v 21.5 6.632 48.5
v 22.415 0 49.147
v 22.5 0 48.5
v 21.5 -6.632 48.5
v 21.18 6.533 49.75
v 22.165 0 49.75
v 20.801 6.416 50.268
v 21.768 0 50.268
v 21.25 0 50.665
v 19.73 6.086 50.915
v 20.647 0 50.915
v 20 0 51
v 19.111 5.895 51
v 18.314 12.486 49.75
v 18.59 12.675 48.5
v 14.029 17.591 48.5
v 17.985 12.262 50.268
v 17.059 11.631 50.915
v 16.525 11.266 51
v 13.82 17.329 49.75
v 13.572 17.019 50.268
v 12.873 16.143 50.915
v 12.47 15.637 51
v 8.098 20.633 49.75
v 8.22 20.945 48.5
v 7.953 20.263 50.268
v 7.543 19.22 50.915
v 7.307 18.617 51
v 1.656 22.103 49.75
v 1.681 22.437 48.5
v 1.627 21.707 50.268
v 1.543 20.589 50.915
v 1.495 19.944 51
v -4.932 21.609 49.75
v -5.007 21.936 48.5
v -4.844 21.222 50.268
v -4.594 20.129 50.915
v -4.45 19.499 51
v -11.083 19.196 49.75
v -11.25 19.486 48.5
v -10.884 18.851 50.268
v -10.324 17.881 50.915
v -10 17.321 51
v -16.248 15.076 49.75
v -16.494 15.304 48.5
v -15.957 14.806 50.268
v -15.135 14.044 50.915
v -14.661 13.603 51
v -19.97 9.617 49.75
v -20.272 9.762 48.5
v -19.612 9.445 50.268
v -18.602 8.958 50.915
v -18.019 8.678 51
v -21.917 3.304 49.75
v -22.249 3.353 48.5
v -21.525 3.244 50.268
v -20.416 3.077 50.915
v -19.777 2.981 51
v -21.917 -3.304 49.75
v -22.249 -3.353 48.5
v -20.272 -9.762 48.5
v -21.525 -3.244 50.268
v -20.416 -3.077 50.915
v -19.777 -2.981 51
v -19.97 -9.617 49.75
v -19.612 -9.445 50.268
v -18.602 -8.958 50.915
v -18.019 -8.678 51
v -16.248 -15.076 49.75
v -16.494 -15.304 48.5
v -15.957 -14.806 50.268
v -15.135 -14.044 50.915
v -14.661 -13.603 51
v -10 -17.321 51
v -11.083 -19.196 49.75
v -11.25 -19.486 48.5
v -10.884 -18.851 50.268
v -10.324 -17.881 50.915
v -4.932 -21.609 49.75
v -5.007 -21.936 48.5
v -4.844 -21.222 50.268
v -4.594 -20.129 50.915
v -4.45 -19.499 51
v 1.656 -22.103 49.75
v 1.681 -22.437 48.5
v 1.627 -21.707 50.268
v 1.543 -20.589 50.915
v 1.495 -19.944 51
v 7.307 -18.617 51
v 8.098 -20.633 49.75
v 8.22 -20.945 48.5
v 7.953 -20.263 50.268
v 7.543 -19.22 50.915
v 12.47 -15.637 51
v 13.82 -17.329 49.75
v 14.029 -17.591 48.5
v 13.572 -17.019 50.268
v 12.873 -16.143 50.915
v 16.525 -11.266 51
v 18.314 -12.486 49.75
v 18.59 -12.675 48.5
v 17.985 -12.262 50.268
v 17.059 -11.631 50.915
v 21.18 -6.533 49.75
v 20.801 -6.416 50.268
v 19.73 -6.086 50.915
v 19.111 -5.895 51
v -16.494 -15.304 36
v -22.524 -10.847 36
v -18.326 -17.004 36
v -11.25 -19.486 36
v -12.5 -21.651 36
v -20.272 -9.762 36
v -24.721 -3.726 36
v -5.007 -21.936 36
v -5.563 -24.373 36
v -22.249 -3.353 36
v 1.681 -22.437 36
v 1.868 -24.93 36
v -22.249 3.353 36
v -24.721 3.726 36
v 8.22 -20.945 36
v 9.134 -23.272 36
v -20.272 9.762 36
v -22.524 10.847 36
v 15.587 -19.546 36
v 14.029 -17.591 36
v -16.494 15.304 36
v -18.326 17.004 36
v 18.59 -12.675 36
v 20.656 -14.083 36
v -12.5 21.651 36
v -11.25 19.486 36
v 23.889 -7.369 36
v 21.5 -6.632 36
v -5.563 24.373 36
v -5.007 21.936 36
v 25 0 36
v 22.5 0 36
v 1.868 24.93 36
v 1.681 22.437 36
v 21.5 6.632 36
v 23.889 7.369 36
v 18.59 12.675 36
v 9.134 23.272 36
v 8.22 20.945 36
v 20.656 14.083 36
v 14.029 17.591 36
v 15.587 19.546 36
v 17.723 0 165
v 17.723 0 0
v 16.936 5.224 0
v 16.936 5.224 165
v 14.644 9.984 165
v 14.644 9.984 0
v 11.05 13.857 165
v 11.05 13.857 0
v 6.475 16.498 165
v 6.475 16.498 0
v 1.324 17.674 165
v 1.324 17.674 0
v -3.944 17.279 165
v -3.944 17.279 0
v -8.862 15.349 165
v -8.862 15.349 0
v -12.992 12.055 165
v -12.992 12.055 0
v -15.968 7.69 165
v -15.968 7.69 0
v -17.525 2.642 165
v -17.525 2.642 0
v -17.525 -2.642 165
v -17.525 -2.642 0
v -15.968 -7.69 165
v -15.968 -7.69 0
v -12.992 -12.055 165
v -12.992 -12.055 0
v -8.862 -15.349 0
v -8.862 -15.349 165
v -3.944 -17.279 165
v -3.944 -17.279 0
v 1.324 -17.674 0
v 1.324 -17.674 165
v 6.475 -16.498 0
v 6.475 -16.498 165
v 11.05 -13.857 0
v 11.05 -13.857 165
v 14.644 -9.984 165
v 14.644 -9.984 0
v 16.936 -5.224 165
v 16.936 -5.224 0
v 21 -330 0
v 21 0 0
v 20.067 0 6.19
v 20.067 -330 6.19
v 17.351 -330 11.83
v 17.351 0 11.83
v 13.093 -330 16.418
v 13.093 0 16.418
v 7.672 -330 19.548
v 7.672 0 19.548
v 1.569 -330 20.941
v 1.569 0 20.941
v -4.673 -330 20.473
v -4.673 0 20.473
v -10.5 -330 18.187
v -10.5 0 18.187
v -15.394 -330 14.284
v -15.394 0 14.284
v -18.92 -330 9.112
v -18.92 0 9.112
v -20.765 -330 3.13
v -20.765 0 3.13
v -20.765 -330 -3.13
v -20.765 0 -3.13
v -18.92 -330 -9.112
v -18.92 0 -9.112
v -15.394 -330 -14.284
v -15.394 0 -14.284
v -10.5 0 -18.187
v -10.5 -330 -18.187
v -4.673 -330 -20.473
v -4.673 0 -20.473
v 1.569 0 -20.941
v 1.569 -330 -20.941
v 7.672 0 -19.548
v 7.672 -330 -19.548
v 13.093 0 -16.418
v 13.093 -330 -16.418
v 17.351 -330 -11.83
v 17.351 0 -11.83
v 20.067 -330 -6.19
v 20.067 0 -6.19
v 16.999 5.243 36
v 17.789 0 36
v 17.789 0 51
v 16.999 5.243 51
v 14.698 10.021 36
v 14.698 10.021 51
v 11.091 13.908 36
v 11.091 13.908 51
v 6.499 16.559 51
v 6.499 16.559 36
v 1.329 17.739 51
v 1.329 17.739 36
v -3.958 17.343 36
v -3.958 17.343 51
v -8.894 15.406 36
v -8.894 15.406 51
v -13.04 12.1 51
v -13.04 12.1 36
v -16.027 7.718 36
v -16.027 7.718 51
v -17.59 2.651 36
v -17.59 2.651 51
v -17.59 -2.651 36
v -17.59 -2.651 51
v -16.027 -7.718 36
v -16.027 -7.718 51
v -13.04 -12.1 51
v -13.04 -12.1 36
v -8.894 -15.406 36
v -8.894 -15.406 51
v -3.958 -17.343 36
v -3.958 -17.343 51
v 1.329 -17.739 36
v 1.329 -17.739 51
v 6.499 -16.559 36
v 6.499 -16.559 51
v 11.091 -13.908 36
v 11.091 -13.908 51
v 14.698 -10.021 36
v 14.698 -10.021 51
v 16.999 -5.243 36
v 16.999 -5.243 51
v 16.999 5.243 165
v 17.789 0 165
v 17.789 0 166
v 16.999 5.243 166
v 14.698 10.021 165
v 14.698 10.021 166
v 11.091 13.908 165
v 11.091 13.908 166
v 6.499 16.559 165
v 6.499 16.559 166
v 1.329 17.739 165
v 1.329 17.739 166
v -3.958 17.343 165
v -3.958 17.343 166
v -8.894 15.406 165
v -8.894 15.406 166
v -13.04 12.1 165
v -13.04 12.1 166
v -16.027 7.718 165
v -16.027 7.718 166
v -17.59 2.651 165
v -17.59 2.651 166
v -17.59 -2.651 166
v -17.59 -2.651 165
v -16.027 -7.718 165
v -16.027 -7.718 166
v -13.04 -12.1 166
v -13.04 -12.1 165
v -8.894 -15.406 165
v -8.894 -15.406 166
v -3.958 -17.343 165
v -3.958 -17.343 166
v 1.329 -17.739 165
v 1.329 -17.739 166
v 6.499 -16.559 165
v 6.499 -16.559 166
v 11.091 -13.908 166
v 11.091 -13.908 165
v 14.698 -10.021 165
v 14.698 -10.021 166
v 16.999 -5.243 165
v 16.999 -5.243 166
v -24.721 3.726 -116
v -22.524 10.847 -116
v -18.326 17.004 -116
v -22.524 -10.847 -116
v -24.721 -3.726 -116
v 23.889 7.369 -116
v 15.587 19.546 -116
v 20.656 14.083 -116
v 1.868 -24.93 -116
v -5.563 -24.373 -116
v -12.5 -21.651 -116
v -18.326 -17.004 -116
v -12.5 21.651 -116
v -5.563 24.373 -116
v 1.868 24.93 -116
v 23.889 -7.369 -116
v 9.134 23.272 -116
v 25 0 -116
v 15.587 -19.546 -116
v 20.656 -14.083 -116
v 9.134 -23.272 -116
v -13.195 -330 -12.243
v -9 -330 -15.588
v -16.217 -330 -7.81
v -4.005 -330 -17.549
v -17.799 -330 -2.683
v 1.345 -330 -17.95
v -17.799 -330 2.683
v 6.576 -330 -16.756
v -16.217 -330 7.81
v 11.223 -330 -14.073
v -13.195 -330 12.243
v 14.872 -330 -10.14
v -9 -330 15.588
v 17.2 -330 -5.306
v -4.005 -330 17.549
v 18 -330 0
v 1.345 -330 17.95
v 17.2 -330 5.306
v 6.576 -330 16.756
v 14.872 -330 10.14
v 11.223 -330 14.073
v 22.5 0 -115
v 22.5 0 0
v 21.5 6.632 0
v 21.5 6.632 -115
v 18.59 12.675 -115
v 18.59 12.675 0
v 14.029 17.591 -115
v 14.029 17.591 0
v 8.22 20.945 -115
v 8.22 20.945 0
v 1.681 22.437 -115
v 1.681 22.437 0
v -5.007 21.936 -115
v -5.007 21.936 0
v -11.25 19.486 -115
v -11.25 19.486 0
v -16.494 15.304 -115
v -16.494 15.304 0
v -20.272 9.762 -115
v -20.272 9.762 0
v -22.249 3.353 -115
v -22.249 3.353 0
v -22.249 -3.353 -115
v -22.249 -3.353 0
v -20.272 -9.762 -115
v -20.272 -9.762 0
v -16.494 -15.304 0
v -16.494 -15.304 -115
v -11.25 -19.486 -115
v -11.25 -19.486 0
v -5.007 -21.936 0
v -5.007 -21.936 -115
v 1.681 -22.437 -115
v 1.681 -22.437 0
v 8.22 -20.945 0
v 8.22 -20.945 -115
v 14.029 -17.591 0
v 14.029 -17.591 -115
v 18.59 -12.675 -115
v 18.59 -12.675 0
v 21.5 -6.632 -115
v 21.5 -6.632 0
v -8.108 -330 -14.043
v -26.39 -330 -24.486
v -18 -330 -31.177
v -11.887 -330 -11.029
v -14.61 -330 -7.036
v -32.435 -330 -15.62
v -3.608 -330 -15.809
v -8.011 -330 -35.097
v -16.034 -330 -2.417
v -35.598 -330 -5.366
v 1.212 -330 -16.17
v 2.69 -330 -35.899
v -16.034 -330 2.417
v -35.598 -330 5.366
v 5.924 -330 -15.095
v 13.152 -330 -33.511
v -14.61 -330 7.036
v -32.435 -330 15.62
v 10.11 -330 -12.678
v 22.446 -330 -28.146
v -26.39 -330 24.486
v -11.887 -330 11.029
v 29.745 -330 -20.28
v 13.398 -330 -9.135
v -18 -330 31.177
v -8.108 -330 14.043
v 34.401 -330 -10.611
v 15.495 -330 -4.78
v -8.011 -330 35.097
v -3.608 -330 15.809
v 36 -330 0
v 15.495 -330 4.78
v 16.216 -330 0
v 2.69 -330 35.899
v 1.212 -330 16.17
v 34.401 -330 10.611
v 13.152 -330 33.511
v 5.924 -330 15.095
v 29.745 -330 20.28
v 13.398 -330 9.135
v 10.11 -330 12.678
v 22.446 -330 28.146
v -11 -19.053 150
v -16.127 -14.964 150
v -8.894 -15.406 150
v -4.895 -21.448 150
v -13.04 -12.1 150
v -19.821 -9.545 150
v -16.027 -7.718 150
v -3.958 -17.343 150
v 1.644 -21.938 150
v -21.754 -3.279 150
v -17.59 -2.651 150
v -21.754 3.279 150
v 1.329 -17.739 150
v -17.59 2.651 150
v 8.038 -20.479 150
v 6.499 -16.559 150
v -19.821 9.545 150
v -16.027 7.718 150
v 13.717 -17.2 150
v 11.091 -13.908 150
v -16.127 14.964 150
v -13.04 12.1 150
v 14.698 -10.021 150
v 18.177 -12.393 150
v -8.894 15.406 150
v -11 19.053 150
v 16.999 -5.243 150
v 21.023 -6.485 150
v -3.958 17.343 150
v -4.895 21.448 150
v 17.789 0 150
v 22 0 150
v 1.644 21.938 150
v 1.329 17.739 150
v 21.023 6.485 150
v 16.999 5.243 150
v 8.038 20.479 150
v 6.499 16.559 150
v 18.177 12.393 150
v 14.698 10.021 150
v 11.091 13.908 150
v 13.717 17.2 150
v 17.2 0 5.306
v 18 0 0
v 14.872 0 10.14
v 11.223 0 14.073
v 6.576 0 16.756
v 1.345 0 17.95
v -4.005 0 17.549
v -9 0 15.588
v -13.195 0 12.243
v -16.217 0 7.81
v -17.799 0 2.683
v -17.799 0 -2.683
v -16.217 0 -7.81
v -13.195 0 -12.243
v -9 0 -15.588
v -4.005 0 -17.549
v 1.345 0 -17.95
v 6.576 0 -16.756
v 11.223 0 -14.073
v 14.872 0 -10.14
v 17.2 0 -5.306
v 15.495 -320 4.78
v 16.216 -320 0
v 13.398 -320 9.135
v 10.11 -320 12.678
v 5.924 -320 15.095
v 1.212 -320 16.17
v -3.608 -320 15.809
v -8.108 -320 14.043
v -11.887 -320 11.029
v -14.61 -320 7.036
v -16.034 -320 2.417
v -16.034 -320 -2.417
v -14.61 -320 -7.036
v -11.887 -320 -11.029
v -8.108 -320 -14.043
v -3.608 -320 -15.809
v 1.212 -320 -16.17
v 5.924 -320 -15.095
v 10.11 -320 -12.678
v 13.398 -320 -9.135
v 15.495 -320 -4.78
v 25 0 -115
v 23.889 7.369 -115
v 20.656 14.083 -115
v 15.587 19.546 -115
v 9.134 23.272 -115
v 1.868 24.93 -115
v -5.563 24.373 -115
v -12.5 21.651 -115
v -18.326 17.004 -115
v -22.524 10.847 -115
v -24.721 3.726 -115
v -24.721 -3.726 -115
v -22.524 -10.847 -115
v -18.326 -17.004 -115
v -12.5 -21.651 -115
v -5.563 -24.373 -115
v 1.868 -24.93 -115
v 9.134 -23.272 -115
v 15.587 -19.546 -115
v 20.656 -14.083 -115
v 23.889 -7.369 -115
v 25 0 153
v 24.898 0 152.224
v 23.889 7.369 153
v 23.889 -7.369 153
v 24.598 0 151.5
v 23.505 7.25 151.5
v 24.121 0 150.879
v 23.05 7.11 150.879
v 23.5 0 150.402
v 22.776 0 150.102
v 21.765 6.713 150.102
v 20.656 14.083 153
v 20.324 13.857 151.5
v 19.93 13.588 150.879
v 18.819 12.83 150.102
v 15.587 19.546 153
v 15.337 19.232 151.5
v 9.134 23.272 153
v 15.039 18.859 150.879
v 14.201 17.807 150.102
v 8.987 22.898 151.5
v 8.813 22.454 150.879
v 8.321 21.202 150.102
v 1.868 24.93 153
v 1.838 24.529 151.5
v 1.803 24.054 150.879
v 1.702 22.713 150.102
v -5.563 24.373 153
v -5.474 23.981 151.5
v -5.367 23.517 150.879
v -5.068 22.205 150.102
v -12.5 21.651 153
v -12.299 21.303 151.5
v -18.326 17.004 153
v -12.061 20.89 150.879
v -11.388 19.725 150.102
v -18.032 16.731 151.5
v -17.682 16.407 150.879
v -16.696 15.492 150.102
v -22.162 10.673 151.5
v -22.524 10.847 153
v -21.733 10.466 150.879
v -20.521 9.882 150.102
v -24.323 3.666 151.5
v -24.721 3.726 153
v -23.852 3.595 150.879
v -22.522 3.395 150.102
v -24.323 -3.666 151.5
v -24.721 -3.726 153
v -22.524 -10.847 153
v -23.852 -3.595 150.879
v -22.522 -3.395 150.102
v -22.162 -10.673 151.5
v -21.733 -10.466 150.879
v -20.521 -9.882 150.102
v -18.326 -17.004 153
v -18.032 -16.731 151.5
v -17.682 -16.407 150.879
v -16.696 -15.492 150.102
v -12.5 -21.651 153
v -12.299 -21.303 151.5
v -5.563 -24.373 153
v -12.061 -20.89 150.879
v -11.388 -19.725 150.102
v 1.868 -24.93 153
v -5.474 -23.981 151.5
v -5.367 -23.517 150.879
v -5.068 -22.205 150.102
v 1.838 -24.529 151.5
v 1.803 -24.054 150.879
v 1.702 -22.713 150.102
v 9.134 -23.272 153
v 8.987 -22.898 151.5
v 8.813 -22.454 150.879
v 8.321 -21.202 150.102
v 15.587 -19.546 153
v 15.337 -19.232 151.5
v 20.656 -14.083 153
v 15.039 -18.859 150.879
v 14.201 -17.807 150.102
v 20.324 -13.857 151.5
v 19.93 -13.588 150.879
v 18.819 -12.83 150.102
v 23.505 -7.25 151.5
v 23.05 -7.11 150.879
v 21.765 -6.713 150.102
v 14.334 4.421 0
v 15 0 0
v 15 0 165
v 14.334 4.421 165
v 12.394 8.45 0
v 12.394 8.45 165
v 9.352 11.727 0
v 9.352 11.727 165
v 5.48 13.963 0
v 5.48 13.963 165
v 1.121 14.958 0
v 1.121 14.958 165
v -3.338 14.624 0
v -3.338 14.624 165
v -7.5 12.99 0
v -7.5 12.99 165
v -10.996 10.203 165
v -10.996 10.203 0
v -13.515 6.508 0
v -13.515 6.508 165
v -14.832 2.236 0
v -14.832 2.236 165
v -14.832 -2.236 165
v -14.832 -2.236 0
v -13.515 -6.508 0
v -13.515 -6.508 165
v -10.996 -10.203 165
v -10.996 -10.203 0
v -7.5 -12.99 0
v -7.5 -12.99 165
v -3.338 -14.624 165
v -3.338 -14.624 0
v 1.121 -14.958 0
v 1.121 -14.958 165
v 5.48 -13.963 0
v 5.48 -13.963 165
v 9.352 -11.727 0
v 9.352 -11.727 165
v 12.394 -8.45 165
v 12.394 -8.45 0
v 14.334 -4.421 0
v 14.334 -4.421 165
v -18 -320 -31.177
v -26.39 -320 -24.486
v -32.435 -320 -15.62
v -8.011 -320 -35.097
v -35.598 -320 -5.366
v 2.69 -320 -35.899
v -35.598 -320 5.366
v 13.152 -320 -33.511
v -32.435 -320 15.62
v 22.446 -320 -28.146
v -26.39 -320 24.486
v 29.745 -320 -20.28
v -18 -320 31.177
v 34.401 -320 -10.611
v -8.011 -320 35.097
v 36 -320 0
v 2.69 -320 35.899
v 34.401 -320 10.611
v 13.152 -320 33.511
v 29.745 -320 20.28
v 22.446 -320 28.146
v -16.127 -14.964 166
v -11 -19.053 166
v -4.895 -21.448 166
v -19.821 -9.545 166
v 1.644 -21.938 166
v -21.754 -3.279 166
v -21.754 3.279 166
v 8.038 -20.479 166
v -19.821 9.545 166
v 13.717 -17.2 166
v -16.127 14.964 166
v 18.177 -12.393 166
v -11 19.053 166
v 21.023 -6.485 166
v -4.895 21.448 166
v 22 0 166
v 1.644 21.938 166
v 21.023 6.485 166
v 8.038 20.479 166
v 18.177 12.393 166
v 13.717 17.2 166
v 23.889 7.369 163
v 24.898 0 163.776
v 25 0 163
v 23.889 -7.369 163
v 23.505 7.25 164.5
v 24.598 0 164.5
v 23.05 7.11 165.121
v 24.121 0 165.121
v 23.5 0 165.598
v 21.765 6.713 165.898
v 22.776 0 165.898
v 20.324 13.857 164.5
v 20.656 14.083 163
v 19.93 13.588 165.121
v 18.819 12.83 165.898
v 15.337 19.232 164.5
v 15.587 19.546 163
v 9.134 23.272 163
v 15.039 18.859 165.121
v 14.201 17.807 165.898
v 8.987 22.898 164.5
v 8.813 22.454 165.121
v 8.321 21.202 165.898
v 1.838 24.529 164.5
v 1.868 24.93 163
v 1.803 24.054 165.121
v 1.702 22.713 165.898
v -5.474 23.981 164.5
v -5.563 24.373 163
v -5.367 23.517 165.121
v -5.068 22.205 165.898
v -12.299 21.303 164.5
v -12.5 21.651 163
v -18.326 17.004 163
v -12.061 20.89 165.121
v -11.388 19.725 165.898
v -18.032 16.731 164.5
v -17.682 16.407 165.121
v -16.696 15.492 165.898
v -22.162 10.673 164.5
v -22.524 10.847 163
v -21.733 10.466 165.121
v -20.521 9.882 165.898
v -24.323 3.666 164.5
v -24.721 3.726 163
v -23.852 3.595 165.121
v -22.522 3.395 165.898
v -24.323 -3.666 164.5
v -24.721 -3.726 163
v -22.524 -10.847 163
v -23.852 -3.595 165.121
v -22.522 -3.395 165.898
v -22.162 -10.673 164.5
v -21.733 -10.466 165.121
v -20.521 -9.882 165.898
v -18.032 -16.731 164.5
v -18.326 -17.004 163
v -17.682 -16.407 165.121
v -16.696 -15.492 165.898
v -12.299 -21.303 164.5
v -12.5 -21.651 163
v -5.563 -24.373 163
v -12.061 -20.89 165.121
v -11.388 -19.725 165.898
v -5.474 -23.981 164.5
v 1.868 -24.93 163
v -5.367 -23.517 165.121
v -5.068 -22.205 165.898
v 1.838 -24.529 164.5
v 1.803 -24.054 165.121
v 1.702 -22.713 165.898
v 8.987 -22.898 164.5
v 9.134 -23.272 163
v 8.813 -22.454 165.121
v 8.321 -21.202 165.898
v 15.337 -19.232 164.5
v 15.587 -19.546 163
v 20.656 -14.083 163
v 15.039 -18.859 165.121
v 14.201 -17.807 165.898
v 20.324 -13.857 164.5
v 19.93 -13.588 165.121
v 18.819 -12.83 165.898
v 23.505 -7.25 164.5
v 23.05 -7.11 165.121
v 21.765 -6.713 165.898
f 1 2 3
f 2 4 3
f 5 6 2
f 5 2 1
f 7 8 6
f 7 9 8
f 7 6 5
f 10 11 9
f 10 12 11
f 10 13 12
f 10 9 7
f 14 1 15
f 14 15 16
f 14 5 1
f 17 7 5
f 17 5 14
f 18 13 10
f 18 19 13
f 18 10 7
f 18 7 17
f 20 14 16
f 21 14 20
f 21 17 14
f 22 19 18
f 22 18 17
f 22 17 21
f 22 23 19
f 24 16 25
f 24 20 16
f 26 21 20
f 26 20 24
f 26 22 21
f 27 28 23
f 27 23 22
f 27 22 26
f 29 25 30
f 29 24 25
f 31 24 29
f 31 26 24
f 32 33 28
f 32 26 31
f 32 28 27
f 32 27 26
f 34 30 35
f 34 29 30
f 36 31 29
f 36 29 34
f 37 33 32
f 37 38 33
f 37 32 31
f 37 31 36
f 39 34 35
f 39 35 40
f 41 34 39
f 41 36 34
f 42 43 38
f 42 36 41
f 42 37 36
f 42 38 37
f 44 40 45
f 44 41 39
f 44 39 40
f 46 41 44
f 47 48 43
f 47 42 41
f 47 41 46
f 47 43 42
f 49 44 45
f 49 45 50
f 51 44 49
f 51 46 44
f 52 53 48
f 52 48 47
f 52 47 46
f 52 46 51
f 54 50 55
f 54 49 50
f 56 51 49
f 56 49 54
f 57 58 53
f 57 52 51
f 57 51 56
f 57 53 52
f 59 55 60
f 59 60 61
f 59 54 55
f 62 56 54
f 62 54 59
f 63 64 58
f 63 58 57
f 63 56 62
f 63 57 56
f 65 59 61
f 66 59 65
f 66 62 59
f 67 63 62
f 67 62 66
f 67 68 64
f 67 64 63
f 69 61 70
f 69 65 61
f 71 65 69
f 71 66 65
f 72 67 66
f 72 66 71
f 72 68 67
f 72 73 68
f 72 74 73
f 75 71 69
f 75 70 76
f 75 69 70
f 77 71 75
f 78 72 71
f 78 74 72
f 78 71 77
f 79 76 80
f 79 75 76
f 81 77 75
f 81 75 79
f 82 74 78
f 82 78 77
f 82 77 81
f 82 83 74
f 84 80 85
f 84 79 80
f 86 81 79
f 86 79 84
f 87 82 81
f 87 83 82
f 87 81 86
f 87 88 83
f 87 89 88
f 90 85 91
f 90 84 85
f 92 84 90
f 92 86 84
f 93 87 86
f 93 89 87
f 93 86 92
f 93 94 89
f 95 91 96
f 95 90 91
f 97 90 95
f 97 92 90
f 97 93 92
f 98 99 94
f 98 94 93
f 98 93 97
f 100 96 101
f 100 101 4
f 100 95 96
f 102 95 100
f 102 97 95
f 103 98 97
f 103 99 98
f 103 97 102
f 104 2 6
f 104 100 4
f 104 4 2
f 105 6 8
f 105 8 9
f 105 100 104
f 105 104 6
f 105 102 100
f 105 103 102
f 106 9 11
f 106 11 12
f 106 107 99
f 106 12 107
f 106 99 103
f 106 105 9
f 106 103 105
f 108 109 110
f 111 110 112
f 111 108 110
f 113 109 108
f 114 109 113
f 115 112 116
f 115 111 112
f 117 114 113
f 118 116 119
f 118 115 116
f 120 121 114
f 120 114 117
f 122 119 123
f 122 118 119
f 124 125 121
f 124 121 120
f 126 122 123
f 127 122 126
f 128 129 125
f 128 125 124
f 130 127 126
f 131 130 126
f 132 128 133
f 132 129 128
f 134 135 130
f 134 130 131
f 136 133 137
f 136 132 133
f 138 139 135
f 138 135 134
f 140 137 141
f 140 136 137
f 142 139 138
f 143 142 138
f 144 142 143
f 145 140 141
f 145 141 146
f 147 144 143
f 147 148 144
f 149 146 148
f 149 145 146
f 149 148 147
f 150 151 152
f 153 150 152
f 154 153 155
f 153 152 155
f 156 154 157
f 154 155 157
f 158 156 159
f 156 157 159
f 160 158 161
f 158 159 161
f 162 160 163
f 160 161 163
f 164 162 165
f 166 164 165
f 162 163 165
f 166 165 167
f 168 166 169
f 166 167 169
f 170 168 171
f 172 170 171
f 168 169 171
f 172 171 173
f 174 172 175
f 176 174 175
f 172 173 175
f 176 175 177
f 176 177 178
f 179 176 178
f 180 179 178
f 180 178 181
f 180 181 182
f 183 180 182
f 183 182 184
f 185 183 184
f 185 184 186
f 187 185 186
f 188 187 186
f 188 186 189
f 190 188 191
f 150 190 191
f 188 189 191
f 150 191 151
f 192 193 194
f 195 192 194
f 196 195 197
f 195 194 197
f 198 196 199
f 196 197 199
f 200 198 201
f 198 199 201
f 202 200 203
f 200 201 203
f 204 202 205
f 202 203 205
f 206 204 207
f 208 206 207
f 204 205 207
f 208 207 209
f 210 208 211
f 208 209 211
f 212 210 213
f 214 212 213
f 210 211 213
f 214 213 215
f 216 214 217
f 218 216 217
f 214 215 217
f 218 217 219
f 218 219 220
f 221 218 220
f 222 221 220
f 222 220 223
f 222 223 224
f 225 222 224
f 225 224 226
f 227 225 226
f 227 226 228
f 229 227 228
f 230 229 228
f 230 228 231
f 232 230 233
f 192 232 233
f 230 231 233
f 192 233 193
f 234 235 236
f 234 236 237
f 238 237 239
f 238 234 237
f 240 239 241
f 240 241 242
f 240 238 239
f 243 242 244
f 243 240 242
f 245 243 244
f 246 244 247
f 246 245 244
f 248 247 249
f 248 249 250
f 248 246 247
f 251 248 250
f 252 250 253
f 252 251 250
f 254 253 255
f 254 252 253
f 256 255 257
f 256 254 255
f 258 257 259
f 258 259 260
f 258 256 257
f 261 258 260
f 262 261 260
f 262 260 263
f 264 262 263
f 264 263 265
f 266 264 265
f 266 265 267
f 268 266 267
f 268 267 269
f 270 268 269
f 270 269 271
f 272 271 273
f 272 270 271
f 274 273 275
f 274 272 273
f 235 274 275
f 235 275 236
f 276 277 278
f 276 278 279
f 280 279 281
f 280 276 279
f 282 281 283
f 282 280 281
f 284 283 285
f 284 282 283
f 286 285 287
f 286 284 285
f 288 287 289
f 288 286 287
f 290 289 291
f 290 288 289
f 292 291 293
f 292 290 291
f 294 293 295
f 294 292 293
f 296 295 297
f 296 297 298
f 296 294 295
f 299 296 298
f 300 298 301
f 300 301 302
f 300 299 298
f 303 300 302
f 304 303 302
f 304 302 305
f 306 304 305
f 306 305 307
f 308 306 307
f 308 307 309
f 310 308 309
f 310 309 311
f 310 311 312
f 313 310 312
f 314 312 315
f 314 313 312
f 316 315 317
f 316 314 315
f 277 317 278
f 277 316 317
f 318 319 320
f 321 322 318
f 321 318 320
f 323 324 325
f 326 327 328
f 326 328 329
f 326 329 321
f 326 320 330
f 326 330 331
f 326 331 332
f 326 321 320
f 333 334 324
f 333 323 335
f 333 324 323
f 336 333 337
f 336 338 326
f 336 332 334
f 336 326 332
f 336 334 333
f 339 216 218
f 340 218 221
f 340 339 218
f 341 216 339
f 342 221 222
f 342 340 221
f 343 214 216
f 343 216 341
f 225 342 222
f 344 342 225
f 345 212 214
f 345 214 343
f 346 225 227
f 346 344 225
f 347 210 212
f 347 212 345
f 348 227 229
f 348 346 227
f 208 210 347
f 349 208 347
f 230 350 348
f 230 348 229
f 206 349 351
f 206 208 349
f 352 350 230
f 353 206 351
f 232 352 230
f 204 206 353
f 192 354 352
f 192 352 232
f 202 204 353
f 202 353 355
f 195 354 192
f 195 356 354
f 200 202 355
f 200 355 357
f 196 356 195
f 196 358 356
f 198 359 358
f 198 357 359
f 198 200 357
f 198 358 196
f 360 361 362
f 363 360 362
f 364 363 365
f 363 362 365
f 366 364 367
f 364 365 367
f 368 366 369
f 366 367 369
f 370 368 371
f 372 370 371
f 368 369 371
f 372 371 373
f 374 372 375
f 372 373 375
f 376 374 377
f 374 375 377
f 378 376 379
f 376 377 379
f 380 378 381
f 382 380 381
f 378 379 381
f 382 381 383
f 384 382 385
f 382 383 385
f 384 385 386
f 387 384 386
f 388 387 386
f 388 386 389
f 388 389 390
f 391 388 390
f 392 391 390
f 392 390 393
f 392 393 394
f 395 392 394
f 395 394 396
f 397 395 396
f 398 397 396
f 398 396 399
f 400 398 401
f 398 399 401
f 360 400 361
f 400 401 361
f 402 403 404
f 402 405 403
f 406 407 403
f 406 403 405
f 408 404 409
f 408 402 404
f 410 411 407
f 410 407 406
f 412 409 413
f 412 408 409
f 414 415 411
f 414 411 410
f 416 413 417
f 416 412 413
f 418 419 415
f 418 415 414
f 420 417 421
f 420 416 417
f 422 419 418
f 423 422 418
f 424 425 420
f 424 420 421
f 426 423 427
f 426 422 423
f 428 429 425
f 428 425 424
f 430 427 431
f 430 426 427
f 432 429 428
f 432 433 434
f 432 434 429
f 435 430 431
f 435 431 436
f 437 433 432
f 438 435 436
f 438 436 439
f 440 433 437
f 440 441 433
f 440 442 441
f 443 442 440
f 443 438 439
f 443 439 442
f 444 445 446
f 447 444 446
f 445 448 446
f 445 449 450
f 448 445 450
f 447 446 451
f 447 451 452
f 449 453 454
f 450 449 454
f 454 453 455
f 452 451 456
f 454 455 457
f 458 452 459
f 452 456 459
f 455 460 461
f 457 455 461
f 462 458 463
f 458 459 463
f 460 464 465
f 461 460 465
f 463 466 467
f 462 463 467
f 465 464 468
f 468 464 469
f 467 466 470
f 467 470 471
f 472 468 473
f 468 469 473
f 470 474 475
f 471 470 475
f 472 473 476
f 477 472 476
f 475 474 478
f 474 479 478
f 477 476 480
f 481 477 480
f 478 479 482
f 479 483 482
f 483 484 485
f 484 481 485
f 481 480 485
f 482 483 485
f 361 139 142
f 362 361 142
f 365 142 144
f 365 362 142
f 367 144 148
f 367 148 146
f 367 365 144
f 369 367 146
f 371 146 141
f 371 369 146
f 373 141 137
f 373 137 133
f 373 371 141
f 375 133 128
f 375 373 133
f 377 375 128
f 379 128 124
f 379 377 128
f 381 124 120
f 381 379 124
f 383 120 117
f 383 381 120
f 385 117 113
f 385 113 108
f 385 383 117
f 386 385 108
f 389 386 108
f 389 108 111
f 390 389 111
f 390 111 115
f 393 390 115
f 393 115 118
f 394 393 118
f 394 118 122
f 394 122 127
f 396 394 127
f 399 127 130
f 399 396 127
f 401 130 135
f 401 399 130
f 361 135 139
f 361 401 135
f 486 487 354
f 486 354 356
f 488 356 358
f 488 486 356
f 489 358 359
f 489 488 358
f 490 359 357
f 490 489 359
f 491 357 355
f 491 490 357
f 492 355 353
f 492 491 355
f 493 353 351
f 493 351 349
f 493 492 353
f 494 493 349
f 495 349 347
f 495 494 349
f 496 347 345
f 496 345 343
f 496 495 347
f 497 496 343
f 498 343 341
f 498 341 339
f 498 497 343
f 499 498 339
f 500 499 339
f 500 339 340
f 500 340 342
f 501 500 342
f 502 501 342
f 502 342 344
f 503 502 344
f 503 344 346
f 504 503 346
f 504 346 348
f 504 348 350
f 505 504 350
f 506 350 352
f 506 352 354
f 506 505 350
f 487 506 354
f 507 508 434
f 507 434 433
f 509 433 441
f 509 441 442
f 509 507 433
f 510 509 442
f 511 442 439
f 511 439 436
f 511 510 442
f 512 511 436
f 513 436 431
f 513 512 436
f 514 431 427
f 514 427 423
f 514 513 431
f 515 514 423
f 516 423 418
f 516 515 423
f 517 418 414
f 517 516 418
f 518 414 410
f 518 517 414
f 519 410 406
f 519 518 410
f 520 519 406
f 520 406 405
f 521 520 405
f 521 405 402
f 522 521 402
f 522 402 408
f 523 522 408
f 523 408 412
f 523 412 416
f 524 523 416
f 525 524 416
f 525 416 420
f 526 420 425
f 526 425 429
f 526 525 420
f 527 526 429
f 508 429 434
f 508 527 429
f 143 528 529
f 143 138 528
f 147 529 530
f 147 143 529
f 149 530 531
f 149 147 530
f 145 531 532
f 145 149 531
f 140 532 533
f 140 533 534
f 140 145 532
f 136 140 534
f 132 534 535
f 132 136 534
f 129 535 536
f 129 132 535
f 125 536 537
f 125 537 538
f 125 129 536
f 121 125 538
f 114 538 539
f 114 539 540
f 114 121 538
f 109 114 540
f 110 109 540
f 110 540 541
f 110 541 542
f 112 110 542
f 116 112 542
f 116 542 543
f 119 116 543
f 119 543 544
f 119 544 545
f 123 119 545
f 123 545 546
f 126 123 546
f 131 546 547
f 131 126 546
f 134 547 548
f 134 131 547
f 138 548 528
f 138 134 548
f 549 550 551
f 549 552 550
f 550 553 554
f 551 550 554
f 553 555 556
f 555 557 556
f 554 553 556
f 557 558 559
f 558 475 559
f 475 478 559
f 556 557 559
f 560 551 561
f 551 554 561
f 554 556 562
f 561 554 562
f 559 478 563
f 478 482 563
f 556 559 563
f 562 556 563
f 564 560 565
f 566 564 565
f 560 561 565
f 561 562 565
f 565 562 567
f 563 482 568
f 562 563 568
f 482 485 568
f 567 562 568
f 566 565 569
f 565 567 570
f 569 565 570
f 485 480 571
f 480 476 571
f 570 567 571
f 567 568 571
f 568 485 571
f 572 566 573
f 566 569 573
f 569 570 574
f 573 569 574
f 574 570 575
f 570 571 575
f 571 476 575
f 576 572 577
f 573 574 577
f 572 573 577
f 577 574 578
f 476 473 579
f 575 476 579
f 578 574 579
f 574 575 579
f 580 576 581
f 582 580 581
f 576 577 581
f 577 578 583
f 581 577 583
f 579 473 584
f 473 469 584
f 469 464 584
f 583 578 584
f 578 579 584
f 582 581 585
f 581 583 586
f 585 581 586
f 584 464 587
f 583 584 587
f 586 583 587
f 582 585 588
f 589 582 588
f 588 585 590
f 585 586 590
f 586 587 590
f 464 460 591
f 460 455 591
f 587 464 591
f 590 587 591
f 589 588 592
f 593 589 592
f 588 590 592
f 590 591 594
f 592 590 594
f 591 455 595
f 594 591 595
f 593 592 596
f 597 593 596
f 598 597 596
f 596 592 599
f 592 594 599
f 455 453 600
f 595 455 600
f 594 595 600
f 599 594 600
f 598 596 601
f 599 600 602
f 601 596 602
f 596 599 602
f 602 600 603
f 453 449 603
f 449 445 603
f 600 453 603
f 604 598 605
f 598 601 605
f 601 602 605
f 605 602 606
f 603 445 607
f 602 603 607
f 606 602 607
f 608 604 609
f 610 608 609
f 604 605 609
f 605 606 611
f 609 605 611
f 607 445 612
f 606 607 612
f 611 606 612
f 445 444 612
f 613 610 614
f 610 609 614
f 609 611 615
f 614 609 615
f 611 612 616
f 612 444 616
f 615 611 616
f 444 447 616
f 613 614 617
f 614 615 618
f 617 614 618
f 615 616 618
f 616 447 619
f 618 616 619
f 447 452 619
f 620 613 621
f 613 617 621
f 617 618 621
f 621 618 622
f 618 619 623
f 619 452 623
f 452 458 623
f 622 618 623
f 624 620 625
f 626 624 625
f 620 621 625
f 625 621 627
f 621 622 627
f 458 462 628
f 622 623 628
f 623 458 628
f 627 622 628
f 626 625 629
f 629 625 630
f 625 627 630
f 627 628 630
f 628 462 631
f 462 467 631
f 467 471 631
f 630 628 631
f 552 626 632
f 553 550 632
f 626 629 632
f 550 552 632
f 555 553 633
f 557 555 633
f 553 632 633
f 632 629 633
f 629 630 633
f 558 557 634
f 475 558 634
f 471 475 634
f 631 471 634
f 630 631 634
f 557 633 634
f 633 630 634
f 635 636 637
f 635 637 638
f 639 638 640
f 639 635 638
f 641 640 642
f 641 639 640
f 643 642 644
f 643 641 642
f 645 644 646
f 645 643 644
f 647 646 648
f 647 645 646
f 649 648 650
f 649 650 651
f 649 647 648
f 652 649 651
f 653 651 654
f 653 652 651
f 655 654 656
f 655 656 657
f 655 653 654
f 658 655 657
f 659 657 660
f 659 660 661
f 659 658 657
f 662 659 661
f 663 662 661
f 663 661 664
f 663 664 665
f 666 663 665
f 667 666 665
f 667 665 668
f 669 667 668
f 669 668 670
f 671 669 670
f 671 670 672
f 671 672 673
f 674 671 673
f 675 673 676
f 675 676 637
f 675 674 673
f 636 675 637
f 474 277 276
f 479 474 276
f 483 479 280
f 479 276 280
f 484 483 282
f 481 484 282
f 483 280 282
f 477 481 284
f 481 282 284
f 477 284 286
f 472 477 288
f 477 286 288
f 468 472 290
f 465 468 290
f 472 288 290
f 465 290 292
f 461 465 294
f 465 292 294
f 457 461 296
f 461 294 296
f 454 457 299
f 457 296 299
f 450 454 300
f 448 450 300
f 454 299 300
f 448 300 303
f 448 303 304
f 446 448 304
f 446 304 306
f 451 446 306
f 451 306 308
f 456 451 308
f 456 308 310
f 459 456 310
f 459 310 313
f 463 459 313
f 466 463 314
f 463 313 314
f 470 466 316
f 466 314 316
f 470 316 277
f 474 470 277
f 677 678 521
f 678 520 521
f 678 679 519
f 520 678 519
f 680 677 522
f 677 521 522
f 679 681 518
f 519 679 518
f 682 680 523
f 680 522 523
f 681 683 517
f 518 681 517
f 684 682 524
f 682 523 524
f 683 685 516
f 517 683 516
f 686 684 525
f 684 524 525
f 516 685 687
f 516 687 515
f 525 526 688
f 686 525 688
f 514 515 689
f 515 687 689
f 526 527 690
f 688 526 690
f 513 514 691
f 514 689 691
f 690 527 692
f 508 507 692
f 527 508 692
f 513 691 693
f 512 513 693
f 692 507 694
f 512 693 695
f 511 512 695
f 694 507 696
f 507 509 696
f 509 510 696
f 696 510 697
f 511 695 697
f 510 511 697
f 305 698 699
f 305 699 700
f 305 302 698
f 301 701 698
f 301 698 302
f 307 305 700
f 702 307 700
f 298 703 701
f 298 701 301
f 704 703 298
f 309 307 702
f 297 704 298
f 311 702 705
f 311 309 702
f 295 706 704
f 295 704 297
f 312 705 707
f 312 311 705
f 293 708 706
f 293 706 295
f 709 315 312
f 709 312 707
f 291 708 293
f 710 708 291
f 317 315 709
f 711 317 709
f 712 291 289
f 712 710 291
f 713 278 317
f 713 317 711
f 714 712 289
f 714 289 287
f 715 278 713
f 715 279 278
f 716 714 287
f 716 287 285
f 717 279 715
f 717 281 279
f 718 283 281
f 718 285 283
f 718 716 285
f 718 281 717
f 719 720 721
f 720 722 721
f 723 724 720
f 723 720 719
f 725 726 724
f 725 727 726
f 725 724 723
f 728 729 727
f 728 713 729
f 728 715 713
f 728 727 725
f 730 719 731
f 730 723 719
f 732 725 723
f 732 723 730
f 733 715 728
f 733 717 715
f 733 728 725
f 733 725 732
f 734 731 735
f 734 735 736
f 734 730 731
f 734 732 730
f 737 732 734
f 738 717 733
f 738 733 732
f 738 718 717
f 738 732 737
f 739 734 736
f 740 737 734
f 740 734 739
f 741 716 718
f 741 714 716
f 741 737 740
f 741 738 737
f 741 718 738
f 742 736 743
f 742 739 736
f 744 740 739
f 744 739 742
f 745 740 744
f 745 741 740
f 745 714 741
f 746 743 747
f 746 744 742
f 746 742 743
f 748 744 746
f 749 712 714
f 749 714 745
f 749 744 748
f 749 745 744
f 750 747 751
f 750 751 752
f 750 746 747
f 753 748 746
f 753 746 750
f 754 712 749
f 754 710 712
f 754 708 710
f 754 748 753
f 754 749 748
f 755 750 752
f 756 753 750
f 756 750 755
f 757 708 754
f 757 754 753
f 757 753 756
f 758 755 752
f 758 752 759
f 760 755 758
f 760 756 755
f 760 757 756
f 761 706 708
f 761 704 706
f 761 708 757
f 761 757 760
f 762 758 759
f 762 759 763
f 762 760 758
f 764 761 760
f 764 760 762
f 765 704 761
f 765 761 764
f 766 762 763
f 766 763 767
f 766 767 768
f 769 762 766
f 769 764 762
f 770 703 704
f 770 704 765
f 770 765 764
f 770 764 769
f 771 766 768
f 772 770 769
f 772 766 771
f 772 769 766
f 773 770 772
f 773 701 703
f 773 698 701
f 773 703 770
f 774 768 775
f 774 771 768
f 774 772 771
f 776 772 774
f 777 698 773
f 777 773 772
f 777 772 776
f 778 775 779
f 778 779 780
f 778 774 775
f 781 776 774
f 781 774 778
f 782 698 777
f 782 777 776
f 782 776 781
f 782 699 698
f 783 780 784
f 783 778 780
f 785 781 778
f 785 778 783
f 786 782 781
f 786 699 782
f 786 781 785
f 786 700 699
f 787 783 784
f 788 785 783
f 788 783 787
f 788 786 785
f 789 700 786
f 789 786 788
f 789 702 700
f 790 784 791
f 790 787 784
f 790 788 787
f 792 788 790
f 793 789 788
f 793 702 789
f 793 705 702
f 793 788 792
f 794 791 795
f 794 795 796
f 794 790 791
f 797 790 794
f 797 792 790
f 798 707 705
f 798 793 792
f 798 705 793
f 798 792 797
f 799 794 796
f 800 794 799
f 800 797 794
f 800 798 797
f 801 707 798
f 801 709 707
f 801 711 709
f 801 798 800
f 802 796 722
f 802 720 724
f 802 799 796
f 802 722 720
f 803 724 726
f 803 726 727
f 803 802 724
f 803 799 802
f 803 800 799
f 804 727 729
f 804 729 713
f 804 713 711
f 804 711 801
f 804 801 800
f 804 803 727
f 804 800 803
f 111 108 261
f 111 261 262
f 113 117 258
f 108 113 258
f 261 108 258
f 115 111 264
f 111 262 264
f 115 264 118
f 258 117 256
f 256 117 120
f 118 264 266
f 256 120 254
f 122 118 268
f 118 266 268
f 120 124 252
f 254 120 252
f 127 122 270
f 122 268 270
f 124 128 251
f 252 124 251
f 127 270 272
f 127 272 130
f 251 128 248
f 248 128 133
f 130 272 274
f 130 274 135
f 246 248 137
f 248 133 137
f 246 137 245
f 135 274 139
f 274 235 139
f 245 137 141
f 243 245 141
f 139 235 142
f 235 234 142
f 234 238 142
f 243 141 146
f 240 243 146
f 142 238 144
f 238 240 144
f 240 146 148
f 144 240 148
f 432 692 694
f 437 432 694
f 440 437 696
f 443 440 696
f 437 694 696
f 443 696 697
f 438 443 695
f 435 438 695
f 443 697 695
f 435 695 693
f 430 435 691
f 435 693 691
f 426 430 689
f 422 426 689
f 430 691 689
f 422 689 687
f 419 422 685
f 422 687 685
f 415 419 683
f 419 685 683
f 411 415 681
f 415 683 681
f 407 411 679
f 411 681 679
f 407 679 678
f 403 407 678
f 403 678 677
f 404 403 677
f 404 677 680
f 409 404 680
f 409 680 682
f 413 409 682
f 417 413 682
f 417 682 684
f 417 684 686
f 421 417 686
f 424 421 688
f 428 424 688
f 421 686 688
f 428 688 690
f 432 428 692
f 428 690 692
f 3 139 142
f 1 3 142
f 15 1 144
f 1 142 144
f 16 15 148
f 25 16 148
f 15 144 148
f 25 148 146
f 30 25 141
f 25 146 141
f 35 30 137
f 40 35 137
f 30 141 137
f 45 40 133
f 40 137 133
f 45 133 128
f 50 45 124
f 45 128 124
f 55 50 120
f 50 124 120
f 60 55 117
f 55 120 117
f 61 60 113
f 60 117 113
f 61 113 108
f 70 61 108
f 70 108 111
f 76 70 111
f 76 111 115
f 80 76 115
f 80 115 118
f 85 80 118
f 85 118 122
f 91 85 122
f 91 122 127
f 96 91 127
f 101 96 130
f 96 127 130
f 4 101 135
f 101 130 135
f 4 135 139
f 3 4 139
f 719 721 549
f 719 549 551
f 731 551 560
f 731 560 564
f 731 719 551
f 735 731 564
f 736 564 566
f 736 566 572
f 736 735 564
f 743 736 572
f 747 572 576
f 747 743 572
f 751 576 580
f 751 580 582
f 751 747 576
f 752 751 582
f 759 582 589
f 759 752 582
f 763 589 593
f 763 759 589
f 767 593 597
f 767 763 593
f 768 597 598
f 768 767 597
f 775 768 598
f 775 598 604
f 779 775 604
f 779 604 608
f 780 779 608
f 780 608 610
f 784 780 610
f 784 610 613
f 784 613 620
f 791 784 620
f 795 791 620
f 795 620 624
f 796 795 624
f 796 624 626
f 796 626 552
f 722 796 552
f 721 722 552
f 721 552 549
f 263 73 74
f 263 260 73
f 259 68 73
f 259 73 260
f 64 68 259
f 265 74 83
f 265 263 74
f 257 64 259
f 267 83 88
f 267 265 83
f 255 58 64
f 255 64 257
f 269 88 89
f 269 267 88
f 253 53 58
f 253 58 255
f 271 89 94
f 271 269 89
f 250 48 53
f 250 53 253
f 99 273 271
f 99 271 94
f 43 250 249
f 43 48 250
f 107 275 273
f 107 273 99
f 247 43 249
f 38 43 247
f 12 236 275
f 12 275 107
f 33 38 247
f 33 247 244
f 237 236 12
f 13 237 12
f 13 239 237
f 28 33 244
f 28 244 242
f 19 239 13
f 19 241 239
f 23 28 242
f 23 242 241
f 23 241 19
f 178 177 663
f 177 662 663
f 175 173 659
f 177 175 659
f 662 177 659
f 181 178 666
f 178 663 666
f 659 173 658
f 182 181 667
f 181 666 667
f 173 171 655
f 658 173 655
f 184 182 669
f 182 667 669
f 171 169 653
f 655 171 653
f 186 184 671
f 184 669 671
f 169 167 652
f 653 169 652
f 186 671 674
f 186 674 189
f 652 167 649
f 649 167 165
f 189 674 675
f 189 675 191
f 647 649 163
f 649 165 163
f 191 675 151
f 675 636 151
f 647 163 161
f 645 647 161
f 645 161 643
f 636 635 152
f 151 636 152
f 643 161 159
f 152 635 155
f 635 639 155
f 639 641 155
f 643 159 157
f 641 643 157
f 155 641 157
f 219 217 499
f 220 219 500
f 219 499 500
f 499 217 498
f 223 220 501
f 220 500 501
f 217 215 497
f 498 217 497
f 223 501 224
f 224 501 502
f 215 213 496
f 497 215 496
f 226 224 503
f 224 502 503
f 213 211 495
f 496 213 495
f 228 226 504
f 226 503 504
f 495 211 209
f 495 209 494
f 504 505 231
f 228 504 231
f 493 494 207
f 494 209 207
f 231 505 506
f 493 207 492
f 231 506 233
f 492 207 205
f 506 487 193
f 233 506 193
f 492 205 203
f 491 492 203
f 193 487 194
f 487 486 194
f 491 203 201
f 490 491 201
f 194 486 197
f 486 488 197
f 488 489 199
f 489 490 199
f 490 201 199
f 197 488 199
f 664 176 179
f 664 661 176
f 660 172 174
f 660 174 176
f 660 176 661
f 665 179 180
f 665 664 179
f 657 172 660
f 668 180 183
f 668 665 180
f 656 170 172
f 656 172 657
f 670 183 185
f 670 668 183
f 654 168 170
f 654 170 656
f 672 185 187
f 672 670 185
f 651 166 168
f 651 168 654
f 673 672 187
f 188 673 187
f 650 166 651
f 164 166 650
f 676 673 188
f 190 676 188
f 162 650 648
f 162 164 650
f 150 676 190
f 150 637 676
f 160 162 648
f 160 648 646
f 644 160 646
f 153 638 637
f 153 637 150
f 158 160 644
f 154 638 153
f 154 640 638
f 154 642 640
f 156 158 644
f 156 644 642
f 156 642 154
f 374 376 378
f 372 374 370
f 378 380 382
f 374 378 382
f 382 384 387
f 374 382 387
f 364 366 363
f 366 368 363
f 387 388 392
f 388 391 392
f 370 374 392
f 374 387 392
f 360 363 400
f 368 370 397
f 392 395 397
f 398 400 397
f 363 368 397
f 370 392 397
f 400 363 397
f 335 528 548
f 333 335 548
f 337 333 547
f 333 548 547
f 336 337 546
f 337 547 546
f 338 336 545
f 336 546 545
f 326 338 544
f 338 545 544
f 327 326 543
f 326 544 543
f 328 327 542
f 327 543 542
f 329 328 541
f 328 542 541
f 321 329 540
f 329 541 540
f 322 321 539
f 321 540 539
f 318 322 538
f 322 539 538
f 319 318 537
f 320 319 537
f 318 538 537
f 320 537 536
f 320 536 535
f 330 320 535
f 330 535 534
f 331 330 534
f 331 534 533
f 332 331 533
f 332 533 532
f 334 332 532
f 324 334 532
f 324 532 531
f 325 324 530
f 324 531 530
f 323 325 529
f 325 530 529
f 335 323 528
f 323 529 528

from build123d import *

# Parameters (mm, degrees)
F0_R           = 21
F0_R_2         = 18
F1_DEPTH       = 330
F2_R           = 25
F2_R_2         = 22.5
F3_DEPTH       = 36
F3_DEPTH_BACK  = 115
F4_R           = 22.5
F4_R_2         = 17.7889981526
F5_DEPTH       = 15
F6_R           = 2.5
F7_R           = 25
F8_DEPTH       = 1
F9_R           = 17.7231972021
F9_R_2         = 15
F10_DEPTH      = 165
F11_R          = 25
F11_R_2        = 17.7889981526
F12_DEPTH      = 1
F12_DEPTH_BACK = 15
F13_R          = 3
F15_R          = 36
F15_R_2        = 16.2155162539
F16_DEPTH      = 10


with BuildPart() as f1:
    # F0 (on Front) → F1 (new body)
    with BuildSketch(Plane.XZ):
        Circle(F0_R)
        Circle(F0_R_2, mode=Mode.SUBTRACT)
    extrude(amount=F1_DEPTH)


with BuildPart() as f3:
    # F2 (on Top) → F3 (new body, two sides)
    with BuildSketch(Plane.XY) as f3_sk:
        Circle(F2_R)
        Circle(F2_R_2, mode=Mode.SUBTRACT)
    extrude(amount=F3_DEPTH)
    extrude(f3_sk.sketch, amount=-F3_DEPTH_BACK)

    # F7 (on face) → F8 (join)
    with BuildSketch(Plane(origin=(0, 0, -115), x_dir=(1, 0, 0), z_dir=(0, 0, -1))):
        Circle(F7_R)
    extrude(amount=F8_DEPTH)


with BuildPart() as f5:
    # F4 (on face) → F5 (new body)
    with BuildSketch(Plane.XY.offset(36)):
        Circle(F4_R)
        Circle(F4_R_2, mode=Mode.SUBTRACT)
    extrude(amount=F5_DEPTH)

    # F6
    f6_edges = [f5.edges().sort_by_distance(p)[0] for p in [
        (-22.5, 0, 51),
    ]]
    fillet(f6_edges, radius=F6_R)


with BuildPart() as f10:
    # F9 (on Top) → F10 (new body)
    with BuildSketch(Plane.XY):
        Circle(F9_R)
        Circle(F9_R_2, mode=Mode.SUBTRACT)
    extrude(amount=F10_DEPTH)


with BuildPart() as f12:
    # F11 (on face) → F12 (new body, two sides)
    with BuildSketch(Plane.XY.offset(165)) as f12_sk:
        Circle(F11_R)
        Circle(F11_R_2, mode=Mode.SUBTRACT)
    extrude(amount=F12_DEPTH)
    extrude(f12_sk.sketch, amount=-F12_DEPTH_BACK)

    # F13
    f13_edges = [f12.edges().sort_by_distance(p)[0] for p in [
        (-25, 0, 166),
        (-25, 0, 150),
    ]]
    fillet(f13_edges, radius=F13_R)


with BuildPart() as f16:
    # F15 (on offset) → F16 (new body)
    with BuildSketch(Plane.XZ.offset(320)):
        Circle(F15_R)
        Circle(F15_R_2, mode=Mode.SUBTRACT)
    extrude(amount=F16_DEPTH)


solid = Compound([f1.part, f3.part, f5.part, f10.part, f12.part, f16.part])
